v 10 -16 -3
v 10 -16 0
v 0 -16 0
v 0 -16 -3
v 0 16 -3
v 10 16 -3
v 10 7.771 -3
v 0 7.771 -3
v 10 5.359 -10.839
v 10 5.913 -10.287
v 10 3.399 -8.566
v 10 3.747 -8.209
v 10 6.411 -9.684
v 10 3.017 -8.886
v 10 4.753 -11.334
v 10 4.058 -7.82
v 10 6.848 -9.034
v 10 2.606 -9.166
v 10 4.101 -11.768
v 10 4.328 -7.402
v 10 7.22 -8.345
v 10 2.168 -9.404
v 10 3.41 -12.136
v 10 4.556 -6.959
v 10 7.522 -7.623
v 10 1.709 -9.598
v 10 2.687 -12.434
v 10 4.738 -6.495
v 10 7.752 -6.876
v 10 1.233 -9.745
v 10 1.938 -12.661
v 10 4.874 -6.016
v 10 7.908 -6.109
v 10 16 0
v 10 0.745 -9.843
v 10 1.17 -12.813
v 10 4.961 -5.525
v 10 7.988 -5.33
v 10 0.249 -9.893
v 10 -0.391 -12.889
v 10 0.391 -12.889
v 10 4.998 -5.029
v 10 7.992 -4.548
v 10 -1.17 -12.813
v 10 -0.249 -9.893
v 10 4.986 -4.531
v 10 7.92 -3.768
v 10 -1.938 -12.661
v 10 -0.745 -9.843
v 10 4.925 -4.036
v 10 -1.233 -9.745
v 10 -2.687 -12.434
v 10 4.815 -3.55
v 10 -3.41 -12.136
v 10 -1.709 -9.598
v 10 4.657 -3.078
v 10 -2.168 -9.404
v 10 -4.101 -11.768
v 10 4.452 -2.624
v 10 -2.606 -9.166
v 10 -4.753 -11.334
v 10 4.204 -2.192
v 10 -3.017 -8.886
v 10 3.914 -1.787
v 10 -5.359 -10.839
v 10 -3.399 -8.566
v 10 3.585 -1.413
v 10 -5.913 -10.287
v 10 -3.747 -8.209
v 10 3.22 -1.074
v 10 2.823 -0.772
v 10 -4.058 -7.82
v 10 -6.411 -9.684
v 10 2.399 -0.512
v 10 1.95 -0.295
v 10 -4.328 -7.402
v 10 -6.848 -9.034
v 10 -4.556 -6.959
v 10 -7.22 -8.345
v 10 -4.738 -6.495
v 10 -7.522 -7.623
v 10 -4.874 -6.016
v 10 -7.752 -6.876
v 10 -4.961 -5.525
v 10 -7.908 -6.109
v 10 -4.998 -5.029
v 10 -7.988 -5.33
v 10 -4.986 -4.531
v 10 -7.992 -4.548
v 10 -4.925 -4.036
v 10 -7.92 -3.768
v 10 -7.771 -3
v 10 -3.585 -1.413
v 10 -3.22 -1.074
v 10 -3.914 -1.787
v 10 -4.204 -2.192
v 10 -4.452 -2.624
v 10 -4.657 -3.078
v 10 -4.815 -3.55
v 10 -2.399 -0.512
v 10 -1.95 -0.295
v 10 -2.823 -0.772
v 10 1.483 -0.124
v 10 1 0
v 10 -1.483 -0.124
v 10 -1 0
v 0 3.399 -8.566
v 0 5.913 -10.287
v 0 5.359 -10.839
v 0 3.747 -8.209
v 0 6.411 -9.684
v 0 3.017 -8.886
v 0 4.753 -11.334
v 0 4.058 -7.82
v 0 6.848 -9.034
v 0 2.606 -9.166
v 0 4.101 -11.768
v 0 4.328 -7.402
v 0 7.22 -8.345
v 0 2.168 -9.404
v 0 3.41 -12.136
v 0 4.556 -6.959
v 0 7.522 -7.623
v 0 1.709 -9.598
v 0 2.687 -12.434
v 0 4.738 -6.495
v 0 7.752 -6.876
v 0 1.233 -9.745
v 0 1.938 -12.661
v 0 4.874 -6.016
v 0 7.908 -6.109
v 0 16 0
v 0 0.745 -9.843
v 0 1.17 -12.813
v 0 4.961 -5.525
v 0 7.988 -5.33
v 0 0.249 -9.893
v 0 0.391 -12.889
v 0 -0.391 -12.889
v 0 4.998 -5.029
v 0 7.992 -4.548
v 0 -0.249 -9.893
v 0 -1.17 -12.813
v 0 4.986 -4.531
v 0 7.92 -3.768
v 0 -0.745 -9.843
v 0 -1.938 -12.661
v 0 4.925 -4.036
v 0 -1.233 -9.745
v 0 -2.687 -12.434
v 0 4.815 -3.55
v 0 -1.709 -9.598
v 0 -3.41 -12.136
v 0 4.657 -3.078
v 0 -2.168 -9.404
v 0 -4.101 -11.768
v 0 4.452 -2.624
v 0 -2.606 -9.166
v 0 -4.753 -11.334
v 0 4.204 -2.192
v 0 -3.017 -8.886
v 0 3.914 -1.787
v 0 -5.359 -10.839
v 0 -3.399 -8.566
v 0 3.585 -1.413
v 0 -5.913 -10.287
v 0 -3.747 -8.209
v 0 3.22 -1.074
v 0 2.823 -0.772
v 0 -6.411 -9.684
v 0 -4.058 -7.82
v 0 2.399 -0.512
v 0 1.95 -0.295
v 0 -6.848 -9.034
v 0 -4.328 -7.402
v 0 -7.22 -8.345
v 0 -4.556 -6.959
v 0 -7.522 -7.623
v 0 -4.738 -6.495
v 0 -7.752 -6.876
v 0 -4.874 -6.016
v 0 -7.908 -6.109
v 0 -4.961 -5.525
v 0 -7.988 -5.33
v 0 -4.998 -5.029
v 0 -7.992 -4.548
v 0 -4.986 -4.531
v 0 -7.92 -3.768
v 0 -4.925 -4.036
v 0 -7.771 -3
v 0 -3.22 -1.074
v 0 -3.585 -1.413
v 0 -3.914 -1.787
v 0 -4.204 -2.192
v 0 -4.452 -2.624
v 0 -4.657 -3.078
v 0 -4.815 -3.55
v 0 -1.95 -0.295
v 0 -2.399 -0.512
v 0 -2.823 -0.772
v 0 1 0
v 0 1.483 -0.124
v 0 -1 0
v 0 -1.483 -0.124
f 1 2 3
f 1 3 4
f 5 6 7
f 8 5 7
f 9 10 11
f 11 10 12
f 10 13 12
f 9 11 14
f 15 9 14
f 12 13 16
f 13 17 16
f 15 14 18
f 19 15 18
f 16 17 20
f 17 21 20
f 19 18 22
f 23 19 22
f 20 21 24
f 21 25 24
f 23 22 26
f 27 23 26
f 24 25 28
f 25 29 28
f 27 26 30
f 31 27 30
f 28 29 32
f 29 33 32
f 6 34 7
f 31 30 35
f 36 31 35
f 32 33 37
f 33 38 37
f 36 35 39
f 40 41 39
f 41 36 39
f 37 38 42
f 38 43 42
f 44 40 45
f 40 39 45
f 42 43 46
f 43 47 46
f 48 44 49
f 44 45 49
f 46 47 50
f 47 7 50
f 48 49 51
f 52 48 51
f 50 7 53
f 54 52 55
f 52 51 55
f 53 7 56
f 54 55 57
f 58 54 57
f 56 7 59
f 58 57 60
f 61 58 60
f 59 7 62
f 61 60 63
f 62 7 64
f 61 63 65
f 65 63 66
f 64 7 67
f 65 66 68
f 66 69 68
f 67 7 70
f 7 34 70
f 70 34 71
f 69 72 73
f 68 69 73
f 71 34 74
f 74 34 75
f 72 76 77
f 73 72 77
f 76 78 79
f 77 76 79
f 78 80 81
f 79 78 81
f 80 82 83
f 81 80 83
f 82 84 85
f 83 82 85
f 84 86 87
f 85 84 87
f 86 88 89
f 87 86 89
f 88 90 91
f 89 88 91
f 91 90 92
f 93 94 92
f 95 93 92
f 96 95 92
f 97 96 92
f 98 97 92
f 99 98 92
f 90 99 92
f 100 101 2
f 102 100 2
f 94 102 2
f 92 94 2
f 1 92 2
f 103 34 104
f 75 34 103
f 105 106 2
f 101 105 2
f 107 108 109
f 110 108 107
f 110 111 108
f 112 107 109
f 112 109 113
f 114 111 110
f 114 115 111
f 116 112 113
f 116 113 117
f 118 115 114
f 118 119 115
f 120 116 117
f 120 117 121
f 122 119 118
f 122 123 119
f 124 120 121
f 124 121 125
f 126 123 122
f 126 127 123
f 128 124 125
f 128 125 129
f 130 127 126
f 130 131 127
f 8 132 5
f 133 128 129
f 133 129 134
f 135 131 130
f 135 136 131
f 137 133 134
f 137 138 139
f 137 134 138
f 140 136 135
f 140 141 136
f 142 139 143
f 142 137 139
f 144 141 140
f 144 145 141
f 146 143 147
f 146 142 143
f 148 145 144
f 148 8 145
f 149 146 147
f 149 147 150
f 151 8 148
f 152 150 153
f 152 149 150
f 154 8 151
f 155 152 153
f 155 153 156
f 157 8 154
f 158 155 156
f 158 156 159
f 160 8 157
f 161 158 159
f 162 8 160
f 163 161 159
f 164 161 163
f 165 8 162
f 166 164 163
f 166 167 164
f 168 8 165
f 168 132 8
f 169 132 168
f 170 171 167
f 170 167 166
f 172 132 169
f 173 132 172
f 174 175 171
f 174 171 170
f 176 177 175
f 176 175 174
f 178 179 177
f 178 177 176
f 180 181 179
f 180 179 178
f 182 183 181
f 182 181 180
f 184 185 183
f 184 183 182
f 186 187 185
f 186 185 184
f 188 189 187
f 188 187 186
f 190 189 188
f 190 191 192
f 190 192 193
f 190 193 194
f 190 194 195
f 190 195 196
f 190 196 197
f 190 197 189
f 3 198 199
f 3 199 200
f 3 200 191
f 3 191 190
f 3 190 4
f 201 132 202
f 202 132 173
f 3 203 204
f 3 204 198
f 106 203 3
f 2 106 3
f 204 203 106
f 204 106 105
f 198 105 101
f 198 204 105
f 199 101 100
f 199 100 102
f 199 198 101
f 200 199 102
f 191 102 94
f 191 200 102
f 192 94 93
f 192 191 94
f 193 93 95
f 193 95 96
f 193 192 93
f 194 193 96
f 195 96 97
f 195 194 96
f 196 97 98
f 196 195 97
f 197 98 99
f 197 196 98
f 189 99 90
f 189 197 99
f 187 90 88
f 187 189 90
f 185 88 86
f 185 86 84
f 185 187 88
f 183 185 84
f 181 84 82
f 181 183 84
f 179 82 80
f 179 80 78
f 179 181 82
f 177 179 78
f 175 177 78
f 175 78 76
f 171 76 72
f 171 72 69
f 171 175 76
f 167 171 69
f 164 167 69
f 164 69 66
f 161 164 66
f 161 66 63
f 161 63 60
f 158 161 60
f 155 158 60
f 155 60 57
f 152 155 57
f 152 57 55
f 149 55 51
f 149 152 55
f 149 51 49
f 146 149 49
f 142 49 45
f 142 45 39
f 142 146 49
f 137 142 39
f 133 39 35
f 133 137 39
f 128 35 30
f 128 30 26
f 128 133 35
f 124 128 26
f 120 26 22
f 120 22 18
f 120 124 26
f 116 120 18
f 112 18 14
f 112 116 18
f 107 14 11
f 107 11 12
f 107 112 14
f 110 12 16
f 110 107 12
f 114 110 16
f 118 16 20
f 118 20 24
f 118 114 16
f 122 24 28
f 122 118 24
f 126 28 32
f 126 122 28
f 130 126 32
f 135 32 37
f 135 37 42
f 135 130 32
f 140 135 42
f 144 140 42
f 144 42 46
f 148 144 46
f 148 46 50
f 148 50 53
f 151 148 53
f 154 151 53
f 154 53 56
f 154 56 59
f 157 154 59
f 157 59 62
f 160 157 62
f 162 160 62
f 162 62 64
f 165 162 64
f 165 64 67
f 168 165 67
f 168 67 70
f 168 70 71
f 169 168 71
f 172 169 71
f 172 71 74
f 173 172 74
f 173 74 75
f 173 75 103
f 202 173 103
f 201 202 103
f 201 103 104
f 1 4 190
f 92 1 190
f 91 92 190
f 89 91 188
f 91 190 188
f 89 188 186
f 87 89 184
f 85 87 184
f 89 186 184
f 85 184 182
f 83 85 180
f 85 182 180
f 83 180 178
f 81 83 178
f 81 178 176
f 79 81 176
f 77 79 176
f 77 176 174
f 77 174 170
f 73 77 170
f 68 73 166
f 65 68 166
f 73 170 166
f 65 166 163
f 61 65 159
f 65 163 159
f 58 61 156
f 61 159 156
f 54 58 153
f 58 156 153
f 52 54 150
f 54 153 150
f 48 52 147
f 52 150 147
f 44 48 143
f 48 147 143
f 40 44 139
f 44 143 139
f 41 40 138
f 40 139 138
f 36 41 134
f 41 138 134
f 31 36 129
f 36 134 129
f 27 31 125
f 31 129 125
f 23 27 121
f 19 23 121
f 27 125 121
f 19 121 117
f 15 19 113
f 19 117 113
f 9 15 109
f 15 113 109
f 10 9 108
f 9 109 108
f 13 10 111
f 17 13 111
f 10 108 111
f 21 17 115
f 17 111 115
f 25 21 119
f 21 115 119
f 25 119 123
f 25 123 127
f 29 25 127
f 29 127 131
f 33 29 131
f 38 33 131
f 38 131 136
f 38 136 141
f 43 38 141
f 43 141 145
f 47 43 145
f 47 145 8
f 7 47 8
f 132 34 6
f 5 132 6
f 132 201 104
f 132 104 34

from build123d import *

# Parameters (mm, degrees)
PAD_DEPTH = 10


with BuildPart() as part:
    # Sketch → Pad (new body)
    with BuildSketch(Plane.YZ):
        with BuildLine():
            ThreePointArc((-1, 0), (0, -9.898979), (1, 0))
            Line((1, 0), (16, 0))
            Line((16, 0), (16, -3))
            Line((16, -3), (7.77135, -3))
            ThreePointArc((-7.77135, -3), (0, -12.898979), (7.77135, -3))
            Line((-16, -3), (-7.77135, -3))
            Line((-16, 0), (-16, -3))
            Line((-1, 0), (-16, 0))
        make_face()
    extrude(amount=PAD_DEPTH)


solid = part.part
